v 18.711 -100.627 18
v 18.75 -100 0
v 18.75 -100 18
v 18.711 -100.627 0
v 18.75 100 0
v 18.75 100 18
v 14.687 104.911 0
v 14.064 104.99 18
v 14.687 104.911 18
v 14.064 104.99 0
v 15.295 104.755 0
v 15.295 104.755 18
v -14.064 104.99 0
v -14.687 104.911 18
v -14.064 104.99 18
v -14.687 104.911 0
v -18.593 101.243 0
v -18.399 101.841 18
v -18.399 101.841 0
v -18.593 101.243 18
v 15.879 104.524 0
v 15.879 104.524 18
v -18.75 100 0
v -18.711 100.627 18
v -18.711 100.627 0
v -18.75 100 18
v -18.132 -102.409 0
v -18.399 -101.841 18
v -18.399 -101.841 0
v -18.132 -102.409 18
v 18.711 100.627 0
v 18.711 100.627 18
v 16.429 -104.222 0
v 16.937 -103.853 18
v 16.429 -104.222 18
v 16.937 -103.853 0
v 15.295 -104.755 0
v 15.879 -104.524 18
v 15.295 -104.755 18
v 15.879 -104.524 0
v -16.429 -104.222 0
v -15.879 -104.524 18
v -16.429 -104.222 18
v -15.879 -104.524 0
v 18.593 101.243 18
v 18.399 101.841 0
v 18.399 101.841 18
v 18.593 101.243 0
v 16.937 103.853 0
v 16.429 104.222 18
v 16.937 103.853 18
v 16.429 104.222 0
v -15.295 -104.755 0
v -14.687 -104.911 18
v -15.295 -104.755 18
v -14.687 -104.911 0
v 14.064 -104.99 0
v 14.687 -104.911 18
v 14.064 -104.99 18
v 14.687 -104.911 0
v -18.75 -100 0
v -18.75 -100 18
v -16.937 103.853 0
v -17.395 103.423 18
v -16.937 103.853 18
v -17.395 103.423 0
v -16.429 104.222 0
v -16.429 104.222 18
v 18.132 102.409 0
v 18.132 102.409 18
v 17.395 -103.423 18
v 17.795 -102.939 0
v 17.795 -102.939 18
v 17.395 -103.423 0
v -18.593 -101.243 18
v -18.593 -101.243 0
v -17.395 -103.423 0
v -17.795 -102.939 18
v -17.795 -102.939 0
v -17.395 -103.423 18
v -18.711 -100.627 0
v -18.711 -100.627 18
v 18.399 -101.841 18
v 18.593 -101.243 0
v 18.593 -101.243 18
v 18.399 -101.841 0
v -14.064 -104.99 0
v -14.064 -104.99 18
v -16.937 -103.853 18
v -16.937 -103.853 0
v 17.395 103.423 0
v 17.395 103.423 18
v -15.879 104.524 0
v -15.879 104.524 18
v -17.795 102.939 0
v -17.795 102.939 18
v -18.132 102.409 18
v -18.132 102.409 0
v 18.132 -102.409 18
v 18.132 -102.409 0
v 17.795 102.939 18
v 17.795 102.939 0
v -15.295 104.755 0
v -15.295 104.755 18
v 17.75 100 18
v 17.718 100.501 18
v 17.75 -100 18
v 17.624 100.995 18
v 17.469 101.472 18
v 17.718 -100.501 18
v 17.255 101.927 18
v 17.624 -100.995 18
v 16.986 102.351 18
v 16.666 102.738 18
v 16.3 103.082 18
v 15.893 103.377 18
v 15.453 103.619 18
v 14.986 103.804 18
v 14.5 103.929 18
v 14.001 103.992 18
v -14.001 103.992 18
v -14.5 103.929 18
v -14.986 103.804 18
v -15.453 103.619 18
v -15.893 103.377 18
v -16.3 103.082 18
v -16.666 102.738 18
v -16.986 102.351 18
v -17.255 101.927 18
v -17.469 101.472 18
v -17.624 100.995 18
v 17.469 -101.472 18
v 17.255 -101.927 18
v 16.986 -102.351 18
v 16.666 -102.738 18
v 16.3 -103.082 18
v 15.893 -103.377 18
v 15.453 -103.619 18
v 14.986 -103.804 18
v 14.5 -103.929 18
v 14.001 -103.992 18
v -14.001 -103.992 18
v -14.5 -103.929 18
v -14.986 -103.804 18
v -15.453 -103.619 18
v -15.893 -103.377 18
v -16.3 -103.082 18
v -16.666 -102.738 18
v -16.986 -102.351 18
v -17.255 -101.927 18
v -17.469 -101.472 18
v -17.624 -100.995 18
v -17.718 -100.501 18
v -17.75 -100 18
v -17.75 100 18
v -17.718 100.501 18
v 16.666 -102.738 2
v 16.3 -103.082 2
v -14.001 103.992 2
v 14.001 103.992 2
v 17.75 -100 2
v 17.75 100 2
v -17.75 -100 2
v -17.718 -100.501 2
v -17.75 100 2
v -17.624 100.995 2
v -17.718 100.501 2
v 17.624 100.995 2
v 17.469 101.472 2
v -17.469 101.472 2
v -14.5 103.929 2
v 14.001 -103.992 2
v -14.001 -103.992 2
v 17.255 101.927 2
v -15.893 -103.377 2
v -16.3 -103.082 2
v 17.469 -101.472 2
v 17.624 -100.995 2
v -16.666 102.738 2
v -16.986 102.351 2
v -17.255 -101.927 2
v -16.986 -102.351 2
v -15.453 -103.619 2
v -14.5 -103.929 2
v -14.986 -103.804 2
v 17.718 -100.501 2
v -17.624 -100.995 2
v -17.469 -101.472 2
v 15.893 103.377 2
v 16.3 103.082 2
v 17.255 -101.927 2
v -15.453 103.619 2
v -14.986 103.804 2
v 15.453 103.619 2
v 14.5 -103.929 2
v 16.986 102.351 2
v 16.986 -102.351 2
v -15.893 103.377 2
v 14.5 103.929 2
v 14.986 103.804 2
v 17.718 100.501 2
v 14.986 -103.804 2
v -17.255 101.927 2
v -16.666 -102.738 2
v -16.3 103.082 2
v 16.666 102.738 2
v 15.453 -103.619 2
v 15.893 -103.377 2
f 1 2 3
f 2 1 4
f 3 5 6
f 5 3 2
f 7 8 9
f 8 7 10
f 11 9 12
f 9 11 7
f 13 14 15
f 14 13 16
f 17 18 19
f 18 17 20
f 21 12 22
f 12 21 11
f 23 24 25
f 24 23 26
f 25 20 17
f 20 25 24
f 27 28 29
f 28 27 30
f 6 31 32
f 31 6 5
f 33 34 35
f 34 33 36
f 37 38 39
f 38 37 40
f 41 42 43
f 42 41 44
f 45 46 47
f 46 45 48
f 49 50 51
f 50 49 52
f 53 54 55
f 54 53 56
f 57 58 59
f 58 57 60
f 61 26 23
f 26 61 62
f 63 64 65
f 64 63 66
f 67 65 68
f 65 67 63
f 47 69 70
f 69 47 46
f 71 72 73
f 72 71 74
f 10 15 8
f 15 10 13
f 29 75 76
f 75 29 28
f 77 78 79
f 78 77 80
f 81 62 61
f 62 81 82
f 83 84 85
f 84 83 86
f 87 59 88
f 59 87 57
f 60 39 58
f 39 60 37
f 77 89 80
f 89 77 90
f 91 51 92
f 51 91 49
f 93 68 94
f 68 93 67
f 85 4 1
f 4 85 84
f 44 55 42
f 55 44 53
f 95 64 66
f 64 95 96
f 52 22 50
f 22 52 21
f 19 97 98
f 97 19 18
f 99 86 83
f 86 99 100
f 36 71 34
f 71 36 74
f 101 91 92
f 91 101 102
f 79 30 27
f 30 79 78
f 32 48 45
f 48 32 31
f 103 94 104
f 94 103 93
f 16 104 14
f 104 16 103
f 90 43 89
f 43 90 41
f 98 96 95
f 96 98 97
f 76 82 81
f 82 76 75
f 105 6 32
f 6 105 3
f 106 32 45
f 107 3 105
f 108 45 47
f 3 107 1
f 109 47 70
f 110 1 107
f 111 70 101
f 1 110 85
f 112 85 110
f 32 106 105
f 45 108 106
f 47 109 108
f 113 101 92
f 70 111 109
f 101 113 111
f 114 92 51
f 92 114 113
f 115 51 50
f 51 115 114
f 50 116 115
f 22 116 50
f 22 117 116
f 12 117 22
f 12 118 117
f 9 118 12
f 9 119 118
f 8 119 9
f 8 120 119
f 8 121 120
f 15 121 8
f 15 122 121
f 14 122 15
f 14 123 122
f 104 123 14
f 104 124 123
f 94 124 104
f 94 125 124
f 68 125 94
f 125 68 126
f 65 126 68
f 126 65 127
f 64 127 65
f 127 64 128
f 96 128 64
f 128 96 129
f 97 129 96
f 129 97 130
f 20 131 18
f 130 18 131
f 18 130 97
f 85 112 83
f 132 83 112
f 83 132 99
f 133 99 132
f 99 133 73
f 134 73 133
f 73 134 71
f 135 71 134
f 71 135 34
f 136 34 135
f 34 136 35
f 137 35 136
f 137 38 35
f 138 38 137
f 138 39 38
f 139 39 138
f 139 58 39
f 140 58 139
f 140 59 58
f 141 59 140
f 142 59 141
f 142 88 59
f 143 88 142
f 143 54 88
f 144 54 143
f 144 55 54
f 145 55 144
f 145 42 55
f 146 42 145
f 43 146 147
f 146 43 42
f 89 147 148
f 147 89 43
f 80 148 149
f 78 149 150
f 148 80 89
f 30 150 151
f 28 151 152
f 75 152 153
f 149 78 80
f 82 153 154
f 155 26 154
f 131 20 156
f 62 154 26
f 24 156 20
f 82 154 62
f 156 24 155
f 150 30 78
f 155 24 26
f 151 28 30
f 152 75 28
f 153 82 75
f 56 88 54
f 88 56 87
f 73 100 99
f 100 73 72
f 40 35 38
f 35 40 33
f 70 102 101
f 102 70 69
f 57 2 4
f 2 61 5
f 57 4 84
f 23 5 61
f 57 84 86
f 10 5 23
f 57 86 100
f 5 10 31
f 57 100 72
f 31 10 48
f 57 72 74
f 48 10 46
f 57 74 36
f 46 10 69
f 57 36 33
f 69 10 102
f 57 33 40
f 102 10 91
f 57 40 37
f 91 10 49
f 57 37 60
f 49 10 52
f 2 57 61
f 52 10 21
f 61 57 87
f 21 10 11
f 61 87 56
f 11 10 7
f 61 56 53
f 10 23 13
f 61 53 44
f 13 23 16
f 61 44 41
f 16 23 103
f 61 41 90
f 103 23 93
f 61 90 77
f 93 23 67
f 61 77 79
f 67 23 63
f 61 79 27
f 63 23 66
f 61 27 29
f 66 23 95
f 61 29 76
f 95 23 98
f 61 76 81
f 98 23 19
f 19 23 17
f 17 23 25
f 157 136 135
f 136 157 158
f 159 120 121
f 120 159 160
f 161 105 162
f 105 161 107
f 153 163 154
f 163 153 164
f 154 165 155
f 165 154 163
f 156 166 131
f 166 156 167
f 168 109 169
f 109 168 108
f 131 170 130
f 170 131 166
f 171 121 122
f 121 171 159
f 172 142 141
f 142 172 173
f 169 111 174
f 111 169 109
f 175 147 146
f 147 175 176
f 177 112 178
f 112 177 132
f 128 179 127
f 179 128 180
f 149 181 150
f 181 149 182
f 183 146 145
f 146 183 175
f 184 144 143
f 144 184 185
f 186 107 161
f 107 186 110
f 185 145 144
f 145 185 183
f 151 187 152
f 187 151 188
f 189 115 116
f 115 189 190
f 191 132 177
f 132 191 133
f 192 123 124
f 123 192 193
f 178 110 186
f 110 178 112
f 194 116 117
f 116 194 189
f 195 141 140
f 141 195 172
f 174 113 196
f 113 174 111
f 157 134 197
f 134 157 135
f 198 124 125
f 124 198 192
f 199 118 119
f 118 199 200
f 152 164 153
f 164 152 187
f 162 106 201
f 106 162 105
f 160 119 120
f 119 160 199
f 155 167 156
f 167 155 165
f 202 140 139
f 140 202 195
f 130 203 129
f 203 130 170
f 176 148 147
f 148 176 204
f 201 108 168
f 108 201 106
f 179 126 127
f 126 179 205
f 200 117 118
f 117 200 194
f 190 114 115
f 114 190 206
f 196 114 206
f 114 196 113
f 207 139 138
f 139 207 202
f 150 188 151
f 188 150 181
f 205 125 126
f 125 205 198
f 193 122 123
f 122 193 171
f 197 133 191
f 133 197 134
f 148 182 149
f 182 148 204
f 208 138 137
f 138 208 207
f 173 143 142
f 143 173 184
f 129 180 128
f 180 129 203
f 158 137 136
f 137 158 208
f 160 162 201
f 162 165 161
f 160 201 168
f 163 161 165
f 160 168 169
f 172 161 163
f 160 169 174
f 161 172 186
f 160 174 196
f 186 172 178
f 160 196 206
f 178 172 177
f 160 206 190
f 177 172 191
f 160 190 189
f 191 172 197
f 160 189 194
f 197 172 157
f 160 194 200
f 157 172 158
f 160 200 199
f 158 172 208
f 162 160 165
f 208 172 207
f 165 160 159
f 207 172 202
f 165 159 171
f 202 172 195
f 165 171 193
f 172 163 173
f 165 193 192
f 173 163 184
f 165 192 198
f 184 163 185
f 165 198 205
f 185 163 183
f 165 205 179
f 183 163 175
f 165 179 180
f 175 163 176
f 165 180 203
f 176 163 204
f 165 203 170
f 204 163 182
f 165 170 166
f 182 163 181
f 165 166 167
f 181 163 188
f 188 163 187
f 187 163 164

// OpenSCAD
$fn = 50;


difference() {
	union() {
		hull() {
			translate(v = [-13.7500000000, 100.0000000000, 0]) {
				cylinder(h = 18, r = 5);
			}
			translate(v = [13.7500000000, 100.0000000000, 0]) {
				cylinder(h = 18, r = 5);
			}
			translate(v = [-13.7500000000, -100.0000000000, 0]) {
				cylinder(h = 18, r = 5);
			}
			translate(v = [13.7500000000, -100.0000000000, 0]) {
				cylinder(h = 18, r = 5);
			}
		}
	}
	union() {
		translate(v = [0, 0, 2]) {
			hull() {
				translate(v = [-13.7500000000, 100.0000000000, 0]) {
					cylinder(h = 16, r = 4);
				}
				translate(v = [13.7500000000, 100.0000000000, 0]) {
					cylinder(h = 16, r = 4);
				}
				translate(v = [-13.7500000000, -100.0000000000, 0]) {
					cylinder(h = 16, r = 4);
				}
				translate(v = [13.7500000000, -100.0000000000, 0]) {
					cylinder(h = 16, r = 4);
				}
			}
		}
	}
}
